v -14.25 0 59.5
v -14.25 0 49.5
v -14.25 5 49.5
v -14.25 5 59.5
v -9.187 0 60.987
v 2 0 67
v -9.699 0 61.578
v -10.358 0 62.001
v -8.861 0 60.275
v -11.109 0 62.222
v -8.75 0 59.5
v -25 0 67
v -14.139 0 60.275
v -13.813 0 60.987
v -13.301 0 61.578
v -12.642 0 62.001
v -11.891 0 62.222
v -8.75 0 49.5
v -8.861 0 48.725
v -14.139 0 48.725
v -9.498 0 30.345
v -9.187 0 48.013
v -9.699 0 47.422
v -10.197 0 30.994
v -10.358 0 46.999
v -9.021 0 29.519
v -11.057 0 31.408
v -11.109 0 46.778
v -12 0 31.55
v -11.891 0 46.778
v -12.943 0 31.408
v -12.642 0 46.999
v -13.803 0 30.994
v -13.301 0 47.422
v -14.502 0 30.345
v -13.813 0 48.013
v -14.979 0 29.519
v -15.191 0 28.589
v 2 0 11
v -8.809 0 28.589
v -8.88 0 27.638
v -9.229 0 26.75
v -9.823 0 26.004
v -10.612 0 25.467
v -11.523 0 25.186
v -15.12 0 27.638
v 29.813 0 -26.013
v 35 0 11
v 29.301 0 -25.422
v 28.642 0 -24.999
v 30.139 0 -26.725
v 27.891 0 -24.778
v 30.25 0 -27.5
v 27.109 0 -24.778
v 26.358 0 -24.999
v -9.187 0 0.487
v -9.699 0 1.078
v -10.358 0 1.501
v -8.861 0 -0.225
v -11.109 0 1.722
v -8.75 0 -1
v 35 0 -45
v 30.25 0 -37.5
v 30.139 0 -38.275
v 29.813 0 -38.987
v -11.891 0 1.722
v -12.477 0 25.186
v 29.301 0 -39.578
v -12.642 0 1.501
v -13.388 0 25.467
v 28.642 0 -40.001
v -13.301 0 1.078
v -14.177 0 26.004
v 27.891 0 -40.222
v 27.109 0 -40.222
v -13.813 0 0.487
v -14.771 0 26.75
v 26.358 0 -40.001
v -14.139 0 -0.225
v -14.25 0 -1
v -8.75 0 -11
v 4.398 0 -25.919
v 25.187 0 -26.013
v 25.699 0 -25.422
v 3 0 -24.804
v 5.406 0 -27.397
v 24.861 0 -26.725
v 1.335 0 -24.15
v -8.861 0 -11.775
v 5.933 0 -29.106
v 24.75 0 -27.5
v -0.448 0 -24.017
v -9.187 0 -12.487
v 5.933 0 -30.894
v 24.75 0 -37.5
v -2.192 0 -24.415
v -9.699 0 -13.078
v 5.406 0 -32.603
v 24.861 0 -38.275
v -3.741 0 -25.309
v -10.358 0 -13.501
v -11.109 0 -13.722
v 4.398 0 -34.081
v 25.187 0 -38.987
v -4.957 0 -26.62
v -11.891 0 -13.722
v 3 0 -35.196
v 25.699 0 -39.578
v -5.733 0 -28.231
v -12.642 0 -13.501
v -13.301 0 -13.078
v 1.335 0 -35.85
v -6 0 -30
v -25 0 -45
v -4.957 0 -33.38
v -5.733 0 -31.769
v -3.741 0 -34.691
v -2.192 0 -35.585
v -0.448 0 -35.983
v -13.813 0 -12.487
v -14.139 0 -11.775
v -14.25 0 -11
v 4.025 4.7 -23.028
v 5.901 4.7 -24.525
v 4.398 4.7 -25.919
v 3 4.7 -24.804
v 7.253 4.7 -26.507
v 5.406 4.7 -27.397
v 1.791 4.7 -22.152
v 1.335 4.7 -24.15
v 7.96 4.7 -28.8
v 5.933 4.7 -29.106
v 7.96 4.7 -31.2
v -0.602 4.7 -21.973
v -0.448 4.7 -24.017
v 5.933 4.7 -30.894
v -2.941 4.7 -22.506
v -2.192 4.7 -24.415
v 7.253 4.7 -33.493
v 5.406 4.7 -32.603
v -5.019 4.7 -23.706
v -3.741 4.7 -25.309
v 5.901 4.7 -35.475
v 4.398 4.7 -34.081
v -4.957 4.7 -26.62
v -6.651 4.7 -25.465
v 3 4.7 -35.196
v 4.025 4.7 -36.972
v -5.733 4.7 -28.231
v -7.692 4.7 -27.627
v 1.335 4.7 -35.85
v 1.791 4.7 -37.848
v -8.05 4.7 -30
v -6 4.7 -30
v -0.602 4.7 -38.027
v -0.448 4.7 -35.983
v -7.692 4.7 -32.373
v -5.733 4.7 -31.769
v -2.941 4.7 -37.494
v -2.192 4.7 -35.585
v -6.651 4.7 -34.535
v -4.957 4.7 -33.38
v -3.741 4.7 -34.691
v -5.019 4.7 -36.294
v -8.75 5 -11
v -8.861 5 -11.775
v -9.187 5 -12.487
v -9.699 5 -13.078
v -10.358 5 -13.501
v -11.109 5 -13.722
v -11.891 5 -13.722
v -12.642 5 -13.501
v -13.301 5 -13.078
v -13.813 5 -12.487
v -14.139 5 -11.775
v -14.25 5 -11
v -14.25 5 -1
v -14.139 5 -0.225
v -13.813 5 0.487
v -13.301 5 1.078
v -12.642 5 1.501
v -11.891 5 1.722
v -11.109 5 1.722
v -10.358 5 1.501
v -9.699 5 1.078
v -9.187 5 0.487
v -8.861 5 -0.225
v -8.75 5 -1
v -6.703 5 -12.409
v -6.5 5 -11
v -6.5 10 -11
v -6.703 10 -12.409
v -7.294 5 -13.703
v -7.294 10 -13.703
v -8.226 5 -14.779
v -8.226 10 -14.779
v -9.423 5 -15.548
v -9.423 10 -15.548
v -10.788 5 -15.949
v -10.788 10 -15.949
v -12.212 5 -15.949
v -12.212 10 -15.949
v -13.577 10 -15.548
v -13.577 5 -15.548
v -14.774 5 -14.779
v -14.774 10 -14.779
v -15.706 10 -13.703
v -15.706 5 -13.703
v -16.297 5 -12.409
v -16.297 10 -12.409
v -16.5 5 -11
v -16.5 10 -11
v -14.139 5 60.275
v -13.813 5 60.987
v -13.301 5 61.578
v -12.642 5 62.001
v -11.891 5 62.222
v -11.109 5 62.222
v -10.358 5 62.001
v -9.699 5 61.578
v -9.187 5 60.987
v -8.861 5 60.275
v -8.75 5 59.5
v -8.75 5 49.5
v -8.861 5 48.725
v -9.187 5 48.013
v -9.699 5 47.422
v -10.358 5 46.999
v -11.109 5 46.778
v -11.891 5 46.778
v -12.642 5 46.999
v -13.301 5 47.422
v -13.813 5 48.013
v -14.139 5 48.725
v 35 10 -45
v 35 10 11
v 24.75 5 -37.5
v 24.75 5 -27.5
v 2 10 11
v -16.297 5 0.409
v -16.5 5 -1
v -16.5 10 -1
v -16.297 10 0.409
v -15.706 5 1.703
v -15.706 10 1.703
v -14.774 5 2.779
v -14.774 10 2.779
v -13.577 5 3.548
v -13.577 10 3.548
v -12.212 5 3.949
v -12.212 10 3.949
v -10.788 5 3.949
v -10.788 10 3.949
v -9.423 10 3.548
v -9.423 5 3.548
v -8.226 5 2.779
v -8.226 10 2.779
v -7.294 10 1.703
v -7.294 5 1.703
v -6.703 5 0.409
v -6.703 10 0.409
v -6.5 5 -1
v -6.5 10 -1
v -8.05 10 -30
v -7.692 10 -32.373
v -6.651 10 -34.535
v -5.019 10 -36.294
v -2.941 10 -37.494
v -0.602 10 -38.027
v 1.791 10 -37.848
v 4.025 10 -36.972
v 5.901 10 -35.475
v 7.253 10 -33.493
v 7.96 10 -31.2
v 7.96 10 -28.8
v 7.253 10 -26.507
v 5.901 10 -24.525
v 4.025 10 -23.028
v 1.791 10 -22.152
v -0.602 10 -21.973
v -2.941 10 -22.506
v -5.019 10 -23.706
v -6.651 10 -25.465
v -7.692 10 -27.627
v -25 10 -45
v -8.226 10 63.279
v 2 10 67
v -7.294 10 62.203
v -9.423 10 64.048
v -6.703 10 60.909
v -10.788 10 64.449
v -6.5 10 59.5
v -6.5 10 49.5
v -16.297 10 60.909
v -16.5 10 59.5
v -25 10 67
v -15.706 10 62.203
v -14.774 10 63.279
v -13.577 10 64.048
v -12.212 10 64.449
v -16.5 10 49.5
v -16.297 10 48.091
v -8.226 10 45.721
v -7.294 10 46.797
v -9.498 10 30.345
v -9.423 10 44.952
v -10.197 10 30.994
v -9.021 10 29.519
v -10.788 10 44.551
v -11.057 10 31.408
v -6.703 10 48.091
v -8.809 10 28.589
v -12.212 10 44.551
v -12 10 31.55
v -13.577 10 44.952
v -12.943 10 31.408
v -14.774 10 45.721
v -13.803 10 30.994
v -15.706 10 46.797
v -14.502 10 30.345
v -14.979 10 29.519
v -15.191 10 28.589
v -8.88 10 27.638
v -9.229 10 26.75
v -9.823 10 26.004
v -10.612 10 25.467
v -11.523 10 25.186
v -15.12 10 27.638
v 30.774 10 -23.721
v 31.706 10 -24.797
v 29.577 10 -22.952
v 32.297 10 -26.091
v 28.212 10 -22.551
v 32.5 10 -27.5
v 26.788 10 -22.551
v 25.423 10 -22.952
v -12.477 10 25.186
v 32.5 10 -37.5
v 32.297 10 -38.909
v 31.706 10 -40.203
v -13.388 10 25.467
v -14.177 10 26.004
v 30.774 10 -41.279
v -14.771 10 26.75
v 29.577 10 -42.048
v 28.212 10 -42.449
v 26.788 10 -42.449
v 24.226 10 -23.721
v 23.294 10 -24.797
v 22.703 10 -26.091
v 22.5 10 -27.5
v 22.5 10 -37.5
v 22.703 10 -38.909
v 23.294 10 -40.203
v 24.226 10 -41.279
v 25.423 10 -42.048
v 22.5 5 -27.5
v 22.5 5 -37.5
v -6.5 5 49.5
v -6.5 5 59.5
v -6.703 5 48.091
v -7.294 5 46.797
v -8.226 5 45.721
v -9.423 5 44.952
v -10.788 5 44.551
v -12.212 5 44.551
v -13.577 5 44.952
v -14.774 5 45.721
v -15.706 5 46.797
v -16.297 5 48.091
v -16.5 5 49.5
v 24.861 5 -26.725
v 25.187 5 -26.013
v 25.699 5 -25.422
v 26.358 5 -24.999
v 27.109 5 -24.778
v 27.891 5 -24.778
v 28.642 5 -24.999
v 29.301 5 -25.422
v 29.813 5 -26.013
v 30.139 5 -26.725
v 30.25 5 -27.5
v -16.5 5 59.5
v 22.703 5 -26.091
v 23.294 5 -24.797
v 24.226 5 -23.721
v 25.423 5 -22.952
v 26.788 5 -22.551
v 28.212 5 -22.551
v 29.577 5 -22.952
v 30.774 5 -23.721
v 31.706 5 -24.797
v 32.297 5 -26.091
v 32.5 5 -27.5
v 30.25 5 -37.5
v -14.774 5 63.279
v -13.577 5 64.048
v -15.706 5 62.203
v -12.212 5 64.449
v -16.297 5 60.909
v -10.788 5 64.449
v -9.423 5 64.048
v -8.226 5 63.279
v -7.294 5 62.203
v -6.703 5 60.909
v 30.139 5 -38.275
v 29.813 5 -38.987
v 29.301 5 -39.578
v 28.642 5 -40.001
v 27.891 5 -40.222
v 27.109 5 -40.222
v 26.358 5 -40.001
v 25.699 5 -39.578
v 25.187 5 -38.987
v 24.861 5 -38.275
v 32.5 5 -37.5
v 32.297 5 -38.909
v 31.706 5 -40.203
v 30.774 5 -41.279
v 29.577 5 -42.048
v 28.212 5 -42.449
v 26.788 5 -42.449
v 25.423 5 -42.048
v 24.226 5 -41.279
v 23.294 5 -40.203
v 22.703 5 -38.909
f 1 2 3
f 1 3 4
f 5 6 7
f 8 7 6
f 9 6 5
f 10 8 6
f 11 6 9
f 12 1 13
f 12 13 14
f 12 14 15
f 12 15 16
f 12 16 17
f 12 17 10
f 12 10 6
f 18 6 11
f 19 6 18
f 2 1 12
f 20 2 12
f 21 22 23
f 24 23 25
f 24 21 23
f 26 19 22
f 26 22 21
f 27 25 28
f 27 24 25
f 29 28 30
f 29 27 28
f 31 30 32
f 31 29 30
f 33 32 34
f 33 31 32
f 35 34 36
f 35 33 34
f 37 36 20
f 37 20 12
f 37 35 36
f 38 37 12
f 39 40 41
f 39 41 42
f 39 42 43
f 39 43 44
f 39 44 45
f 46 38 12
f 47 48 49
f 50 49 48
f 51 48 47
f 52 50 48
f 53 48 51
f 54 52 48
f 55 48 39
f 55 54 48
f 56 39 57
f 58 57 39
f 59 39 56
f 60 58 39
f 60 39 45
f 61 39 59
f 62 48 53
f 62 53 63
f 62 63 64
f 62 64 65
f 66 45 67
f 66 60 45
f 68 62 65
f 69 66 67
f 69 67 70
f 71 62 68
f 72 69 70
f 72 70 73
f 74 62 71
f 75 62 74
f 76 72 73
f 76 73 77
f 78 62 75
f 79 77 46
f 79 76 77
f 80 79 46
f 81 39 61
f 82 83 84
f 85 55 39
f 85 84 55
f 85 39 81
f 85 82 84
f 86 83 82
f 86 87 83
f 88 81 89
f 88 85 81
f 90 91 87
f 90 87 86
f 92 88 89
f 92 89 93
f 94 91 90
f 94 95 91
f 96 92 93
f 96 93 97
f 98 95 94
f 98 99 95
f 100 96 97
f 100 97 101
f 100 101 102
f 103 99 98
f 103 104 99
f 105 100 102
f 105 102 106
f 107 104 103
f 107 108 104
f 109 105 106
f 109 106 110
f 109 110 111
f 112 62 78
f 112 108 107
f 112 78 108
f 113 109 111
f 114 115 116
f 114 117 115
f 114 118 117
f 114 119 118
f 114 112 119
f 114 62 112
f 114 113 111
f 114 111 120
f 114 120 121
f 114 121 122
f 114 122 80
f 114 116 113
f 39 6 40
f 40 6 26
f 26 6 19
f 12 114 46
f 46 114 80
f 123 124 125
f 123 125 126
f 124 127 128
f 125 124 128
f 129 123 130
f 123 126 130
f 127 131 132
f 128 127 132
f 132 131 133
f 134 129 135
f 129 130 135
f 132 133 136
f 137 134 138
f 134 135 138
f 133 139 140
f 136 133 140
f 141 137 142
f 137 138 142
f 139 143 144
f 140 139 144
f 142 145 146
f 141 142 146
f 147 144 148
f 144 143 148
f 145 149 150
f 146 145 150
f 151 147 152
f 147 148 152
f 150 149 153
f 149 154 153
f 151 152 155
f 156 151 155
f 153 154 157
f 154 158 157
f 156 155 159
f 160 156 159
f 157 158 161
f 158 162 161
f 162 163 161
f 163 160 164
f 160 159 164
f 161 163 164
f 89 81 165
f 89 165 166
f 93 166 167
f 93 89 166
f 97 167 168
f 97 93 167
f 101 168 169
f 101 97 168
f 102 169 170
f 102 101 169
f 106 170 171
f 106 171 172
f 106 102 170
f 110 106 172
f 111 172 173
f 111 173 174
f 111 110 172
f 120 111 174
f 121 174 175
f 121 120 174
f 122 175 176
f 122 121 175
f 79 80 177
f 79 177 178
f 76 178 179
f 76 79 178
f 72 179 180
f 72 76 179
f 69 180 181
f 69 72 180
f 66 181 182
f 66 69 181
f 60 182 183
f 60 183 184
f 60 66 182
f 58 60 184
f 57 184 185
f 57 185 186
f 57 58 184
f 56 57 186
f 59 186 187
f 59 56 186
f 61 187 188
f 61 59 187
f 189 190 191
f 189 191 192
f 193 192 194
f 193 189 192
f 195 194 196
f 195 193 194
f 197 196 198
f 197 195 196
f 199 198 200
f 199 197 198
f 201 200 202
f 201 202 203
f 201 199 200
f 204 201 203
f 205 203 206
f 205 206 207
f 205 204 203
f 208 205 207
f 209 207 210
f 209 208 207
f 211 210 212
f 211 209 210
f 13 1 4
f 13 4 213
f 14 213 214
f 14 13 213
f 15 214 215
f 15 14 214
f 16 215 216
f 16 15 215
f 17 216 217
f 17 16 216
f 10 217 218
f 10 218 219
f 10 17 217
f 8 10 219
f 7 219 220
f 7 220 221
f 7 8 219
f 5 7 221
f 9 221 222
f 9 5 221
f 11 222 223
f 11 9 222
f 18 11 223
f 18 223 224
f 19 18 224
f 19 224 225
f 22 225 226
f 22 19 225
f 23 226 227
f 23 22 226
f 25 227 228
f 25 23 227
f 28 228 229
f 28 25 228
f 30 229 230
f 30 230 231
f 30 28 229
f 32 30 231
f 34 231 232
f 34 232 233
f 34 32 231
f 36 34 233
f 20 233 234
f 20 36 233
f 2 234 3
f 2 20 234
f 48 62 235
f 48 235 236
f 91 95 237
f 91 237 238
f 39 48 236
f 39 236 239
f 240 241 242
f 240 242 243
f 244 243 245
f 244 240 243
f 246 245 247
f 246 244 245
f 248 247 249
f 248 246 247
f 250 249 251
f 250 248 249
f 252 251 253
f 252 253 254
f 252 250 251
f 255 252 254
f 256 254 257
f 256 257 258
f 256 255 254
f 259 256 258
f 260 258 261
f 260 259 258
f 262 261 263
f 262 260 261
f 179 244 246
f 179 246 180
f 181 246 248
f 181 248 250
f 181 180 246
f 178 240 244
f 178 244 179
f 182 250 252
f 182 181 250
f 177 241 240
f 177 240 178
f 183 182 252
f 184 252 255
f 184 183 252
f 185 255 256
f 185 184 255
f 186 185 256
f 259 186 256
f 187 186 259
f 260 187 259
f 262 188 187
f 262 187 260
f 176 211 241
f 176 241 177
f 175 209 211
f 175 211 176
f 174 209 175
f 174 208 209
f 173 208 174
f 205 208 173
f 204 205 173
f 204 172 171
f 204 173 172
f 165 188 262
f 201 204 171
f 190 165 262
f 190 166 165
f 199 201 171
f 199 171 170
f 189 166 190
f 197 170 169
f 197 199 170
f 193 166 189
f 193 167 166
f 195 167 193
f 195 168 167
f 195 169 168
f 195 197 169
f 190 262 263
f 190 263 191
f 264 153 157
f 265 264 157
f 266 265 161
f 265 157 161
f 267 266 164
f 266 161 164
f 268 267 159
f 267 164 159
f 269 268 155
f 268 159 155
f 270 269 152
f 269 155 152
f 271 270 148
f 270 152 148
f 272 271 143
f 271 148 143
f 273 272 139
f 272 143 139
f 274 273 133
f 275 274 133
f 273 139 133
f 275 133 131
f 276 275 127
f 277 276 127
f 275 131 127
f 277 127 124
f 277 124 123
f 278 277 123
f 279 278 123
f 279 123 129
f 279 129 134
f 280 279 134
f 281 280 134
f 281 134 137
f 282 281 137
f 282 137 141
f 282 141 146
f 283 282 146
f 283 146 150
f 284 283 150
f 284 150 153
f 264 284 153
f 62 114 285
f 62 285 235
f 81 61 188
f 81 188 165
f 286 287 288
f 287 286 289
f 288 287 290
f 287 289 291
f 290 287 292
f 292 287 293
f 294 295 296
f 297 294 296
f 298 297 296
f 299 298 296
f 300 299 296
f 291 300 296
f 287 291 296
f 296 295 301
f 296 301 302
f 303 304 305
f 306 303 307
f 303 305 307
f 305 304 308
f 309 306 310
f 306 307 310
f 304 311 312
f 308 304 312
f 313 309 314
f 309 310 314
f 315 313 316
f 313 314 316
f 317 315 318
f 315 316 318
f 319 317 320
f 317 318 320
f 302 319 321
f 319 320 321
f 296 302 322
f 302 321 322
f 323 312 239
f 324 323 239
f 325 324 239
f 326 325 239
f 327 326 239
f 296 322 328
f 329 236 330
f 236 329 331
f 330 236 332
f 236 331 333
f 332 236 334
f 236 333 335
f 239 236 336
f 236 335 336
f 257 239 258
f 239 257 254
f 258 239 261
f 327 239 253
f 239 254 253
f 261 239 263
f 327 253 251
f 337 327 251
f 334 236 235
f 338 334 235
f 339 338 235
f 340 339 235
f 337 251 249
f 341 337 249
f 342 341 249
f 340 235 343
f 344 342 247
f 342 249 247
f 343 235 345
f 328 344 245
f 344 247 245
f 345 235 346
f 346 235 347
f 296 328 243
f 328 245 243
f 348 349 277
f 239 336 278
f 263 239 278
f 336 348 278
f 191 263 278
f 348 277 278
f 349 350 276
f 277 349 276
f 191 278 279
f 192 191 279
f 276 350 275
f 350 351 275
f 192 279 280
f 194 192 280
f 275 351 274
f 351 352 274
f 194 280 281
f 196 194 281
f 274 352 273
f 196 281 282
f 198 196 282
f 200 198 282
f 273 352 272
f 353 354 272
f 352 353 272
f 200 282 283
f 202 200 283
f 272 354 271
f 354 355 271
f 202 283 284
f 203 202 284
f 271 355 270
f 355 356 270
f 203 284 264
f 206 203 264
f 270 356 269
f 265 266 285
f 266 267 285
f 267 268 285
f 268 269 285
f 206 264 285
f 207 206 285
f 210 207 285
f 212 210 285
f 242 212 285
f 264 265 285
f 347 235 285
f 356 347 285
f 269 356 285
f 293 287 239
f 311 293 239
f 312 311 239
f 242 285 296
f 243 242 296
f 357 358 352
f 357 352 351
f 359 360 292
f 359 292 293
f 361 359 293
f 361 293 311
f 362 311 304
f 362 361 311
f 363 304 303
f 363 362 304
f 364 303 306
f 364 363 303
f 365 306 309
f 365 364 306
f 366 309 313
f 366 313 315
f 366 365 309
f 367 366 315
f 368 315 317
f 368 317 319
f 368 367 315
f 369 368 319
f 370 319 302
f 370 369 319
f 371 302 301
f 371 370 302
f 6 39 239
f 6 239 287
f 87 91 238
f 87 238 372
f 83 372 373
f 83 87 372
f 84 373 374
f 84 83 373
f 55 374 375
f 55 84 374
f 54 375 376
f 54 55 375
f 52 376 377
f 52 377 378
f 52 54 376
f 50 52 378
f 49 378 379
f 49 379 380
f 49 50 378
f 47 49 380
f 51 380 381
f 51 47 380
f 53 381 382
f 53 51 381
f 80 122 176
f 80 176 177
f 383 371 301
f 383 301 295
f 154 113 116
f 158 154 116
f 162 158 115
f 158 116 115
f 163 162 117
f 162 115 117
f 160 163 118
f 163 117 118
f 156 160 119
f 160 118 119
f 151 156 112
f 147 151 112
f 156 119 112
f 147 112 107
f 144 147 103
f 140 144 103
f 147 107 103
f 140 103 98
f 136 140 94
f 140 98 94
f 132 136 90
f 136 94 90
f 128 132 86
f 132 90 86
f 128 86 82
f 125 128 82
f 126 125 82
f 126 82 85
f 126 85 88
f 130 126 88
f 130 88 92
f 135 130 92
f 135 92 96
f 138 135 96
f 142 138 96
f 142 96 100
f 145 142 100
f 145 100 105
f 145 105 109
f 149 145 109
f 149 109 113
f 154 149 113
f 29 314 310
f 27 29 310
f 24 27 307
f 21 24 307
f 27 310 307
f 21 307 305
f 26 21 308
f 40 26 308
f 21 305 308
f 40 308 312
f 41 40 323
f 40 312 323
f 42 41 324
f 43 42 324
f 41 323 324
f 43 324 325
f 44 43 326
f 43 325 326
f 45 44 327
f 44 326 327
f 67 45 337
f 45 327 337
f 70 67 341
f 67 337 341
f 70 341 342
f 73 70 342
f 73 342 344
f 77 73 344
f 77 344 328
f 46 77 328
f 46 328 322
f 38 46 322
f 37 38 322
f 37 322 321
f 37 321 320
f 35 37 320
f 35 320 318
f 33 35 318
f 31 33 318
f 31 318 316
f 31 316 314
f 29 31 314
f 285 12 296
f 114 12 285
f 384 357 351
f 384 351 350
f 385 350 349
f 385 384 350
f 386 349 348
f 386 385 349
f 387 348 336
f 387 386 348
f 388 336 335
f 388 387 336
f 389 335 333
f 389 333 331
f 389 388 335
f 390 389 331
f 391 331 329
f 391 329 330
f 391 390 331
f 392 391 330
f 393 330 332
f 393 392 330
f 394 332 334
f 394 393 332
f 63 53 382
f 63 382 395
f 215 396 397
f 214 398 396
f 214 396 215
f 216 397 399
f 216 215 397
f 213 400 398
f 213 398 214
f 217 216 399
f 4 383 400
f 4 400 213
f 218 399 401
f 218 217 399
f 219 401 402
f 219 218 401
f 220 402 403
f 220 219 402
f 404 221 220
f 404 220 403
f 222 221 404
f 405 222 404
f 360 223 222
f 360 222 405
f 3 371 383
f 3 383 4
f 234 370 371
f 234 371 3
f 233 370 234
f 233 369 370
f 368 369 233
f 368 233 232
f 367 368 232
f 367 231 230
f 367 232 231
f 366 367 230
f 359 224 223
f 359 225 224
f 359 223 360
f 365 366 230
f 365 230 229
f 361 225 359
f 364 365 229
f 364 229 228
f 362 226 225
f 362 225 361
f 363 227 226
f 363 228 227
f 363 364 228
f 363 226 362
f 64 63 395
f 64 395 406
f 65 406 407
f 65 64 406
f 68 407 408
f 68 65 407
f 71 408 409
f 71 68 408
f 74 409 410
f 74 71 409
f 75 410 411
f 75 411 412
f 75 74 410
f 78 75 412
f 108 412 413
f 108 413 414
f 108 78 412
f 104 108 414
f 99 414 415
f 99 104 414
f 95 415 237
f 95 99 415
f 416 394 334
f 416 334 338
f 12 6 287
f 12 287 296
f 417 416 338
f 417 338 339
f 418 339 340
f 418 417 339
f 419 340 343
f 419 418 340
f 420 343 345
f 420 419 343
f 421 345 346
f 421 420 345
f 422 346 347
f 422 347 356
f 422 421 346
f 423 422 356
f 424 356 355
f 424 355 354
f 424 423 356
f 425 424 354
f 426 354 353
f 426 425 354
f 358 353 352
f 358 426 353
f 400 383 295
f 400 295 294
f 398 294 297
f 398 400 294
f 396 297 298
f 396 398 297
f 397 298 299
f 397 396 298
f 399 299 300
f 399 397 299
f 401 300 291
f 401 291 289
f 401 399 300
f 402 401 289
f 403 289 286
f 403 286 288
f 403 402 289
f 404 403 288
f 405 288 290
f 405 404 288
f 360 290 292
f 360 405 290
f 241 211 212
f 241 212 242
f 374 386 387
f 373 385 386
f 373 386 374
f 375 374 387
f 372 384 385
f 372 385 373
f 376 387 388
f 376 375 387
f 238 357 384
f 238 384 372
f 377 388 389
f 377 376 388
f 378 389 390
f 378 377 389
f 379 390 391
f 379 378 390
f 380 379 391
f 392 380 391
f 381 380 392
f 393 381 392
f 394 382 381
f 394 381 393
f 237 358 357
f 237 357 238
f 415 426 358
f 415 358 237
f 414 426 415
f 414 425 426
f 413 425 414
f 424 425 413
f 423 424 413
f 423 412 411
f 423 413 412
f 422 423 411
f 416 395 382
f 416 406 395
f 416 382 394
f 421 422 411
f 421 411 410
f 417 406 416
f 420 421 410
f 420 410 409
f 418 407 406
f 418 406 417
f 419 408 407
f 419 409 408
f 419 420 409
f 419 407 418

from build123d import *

# Parameters (mm, degrees)
BOSS_EXTRUDE1_DEPTH             = 10
CBORE_START                     = 5
CBORE_SLOT_FOR_M5_SHCS1_DEPTH   = 5
CBORE_SLOT_FOR_M5_SHCS1_2_DEPTH = 5
F_1_0MM_DOWEL_HOLE1_D           = 16.1
F_1_0MM_DOWEL_HOLE1_DEPTH       = 5.3
F_1_0MM_DOWEL_HOLE3_D           = 12
SKETCH14_R                      = 3.2
CUT_EXTRUDE1_DEPTH              = 77.249590163


# Read off the part's stored shape, not the designer's step: CBORE SLOT for M5 SHCS1
with BuildPart() as part:
    # Sketch1 → Boss-Extrude1 (new body)
    with BuildSketch(Plane(origin=(0, 0, 0), x_dir=(1, 0, 0), z_dir=(0, 1, 0))):
        Polygon((-25, 45), (35, 45), (35, -11), (2, -11), (2, -67), (-25, -67), align=None)
    extrude(amount=BOSS_EXTRUDE1_DEPTH)

    # CBORE SLOT for M5 SHCS1 outline → CBORE SLOT for M5 SHCS1 (cut)
    with BuildSketch(Plane(origin=(0, 0, 0), x_dir=(1, 0, 0), z_dir=(0, 1, 0)).offset(CBORE_START)):
        with BuildLine():
            Line((-6.5, -59.5), (-6.5, -49.5))
            ThreePointArc((-6.5, -49.5), (-11.5, -44.5), (-16.5, -49.5))
            Line((-16.5, -49.5), (-16.5, -59.5))
            ThreePointArc((-16.5, -59.5), (-11.5, -64.5), (-6.5, -59.5))
        make_face()
        with BuildLine():
            ThreePointArc((-6.5, 11), (-11.5, 16), (-16.5, 11))
            Line((-16.5, 11), (-16.5, 1))
            ThreePointArc((-16.5, 1), (-11.5, -4), (-6.5, 1))
            Line((-6.5, 1), (-6.5, 11))
        make_face()
        with BuildLine():
            Line((32.5, 27.5), (32.5, 37.5))
            ThreePointArc((32.5, 37.5), (27.5, 42.5), (22.5, 37.5))
            Line((22.5, 37.5), (22.5, 27.5))
            ThreePointArc((22.5, 27.5), (27.5, 22.5), (32.5, 27.5))
        make_face()
    extrude(amount=CBORE_SLOT_FOR_M5_SHCS1_DEPTH, mode=Mode.SUBTRACT)

    # CBORE SLOT for M5 SHCS1 2 outline → CBORE SLOT for M5 SHCS1 2 (cut)
    with BuildSketch(Plane(origin=(0, 0, 0), x_dir=(1, 0, 0), z_dir=(0, 1, 0))):
        with BuildLine():
            Line((-8.75, -59.5), (-8.75, -49.5))
            ThreePointArc((-8.75, -49.5), (-11.5, -46.75), (-14.25, -49.5))
            Line((-14.25, -49.5), (-14.25, -59.5))
            ThreePointArc((-14.25, -59.5), (-11.5, -62.25), (-8.75, -59.5))
        make_face()
        with BuildLine():
            ThreePointArc((-8.75, 11), (-11.5, 13.75), (-14.25, 11))
            Line((-14.25, 11), (-14.25, 1))
            ThreePointArc((-14.25, 1), (-11.5, -1.75), (-8.75, 1))
            Line((-8.75, 1), (-8.75, 11))
        make_face()
        with BuildLine():
            Line((30.25, 27.5), (30.25, 37.5))
            ThreePointArc((30.25, 37.5), (27.5, 40.25), (24.75, 37.5))
            Line((24.75, 37.5), (24.75, 27.5))
            ThreePointArc((24.75, 27.5), (27.5, 24.75), (30.25, 27.5))
        make_face()
    extrude(amount=CBORE_SLOT_FOR_M5_SHCS1_2_DEPTH, mode=Mode.SUBTRACT)

    # Ø1.0mm Dowel Hole1
    with Locations(Plane(origin=(0, 10, 0), x_dir=(1, 0, 0), z_dir=(0, 1, 0))):
        with Locations((0, 30)):
            Hole(F_1_0MM_DOWEL_HOLE1_D / 2, depth=F_1_0MM_DOWEL_HOLE1_DEPTH)

    # Ø1.0mm Dowel Hole3 (through all)
    with Locations(Plane(origin=(0, 4.7, 0), x_dir=(1, 0, 0), z_dir=(0, 1, 0))):
        with Locations((0, 30)):
            Hole(F_1_0MM_DOWEL_HOLE3_D / 2)

    # Sketch14 → Cut-Extrude1 (cut, through all)
    with BuildSketch(Plane(origin=(0, 10, 0), x_dir=(1, 0, 0), z_dir=(0, 1, 0))):
        with Locations((12, -28.35)):
            Circle(SKETCH14_R)
        with Locations(Location((-12, -28.35, 0), (0, 0, 270))):
            Circle(SKETCH14_R)
    extrude(amount=-CUT_EXTRUDE1_DEPTH, mode=Mode.SUBTRACT)


solid = part.part
